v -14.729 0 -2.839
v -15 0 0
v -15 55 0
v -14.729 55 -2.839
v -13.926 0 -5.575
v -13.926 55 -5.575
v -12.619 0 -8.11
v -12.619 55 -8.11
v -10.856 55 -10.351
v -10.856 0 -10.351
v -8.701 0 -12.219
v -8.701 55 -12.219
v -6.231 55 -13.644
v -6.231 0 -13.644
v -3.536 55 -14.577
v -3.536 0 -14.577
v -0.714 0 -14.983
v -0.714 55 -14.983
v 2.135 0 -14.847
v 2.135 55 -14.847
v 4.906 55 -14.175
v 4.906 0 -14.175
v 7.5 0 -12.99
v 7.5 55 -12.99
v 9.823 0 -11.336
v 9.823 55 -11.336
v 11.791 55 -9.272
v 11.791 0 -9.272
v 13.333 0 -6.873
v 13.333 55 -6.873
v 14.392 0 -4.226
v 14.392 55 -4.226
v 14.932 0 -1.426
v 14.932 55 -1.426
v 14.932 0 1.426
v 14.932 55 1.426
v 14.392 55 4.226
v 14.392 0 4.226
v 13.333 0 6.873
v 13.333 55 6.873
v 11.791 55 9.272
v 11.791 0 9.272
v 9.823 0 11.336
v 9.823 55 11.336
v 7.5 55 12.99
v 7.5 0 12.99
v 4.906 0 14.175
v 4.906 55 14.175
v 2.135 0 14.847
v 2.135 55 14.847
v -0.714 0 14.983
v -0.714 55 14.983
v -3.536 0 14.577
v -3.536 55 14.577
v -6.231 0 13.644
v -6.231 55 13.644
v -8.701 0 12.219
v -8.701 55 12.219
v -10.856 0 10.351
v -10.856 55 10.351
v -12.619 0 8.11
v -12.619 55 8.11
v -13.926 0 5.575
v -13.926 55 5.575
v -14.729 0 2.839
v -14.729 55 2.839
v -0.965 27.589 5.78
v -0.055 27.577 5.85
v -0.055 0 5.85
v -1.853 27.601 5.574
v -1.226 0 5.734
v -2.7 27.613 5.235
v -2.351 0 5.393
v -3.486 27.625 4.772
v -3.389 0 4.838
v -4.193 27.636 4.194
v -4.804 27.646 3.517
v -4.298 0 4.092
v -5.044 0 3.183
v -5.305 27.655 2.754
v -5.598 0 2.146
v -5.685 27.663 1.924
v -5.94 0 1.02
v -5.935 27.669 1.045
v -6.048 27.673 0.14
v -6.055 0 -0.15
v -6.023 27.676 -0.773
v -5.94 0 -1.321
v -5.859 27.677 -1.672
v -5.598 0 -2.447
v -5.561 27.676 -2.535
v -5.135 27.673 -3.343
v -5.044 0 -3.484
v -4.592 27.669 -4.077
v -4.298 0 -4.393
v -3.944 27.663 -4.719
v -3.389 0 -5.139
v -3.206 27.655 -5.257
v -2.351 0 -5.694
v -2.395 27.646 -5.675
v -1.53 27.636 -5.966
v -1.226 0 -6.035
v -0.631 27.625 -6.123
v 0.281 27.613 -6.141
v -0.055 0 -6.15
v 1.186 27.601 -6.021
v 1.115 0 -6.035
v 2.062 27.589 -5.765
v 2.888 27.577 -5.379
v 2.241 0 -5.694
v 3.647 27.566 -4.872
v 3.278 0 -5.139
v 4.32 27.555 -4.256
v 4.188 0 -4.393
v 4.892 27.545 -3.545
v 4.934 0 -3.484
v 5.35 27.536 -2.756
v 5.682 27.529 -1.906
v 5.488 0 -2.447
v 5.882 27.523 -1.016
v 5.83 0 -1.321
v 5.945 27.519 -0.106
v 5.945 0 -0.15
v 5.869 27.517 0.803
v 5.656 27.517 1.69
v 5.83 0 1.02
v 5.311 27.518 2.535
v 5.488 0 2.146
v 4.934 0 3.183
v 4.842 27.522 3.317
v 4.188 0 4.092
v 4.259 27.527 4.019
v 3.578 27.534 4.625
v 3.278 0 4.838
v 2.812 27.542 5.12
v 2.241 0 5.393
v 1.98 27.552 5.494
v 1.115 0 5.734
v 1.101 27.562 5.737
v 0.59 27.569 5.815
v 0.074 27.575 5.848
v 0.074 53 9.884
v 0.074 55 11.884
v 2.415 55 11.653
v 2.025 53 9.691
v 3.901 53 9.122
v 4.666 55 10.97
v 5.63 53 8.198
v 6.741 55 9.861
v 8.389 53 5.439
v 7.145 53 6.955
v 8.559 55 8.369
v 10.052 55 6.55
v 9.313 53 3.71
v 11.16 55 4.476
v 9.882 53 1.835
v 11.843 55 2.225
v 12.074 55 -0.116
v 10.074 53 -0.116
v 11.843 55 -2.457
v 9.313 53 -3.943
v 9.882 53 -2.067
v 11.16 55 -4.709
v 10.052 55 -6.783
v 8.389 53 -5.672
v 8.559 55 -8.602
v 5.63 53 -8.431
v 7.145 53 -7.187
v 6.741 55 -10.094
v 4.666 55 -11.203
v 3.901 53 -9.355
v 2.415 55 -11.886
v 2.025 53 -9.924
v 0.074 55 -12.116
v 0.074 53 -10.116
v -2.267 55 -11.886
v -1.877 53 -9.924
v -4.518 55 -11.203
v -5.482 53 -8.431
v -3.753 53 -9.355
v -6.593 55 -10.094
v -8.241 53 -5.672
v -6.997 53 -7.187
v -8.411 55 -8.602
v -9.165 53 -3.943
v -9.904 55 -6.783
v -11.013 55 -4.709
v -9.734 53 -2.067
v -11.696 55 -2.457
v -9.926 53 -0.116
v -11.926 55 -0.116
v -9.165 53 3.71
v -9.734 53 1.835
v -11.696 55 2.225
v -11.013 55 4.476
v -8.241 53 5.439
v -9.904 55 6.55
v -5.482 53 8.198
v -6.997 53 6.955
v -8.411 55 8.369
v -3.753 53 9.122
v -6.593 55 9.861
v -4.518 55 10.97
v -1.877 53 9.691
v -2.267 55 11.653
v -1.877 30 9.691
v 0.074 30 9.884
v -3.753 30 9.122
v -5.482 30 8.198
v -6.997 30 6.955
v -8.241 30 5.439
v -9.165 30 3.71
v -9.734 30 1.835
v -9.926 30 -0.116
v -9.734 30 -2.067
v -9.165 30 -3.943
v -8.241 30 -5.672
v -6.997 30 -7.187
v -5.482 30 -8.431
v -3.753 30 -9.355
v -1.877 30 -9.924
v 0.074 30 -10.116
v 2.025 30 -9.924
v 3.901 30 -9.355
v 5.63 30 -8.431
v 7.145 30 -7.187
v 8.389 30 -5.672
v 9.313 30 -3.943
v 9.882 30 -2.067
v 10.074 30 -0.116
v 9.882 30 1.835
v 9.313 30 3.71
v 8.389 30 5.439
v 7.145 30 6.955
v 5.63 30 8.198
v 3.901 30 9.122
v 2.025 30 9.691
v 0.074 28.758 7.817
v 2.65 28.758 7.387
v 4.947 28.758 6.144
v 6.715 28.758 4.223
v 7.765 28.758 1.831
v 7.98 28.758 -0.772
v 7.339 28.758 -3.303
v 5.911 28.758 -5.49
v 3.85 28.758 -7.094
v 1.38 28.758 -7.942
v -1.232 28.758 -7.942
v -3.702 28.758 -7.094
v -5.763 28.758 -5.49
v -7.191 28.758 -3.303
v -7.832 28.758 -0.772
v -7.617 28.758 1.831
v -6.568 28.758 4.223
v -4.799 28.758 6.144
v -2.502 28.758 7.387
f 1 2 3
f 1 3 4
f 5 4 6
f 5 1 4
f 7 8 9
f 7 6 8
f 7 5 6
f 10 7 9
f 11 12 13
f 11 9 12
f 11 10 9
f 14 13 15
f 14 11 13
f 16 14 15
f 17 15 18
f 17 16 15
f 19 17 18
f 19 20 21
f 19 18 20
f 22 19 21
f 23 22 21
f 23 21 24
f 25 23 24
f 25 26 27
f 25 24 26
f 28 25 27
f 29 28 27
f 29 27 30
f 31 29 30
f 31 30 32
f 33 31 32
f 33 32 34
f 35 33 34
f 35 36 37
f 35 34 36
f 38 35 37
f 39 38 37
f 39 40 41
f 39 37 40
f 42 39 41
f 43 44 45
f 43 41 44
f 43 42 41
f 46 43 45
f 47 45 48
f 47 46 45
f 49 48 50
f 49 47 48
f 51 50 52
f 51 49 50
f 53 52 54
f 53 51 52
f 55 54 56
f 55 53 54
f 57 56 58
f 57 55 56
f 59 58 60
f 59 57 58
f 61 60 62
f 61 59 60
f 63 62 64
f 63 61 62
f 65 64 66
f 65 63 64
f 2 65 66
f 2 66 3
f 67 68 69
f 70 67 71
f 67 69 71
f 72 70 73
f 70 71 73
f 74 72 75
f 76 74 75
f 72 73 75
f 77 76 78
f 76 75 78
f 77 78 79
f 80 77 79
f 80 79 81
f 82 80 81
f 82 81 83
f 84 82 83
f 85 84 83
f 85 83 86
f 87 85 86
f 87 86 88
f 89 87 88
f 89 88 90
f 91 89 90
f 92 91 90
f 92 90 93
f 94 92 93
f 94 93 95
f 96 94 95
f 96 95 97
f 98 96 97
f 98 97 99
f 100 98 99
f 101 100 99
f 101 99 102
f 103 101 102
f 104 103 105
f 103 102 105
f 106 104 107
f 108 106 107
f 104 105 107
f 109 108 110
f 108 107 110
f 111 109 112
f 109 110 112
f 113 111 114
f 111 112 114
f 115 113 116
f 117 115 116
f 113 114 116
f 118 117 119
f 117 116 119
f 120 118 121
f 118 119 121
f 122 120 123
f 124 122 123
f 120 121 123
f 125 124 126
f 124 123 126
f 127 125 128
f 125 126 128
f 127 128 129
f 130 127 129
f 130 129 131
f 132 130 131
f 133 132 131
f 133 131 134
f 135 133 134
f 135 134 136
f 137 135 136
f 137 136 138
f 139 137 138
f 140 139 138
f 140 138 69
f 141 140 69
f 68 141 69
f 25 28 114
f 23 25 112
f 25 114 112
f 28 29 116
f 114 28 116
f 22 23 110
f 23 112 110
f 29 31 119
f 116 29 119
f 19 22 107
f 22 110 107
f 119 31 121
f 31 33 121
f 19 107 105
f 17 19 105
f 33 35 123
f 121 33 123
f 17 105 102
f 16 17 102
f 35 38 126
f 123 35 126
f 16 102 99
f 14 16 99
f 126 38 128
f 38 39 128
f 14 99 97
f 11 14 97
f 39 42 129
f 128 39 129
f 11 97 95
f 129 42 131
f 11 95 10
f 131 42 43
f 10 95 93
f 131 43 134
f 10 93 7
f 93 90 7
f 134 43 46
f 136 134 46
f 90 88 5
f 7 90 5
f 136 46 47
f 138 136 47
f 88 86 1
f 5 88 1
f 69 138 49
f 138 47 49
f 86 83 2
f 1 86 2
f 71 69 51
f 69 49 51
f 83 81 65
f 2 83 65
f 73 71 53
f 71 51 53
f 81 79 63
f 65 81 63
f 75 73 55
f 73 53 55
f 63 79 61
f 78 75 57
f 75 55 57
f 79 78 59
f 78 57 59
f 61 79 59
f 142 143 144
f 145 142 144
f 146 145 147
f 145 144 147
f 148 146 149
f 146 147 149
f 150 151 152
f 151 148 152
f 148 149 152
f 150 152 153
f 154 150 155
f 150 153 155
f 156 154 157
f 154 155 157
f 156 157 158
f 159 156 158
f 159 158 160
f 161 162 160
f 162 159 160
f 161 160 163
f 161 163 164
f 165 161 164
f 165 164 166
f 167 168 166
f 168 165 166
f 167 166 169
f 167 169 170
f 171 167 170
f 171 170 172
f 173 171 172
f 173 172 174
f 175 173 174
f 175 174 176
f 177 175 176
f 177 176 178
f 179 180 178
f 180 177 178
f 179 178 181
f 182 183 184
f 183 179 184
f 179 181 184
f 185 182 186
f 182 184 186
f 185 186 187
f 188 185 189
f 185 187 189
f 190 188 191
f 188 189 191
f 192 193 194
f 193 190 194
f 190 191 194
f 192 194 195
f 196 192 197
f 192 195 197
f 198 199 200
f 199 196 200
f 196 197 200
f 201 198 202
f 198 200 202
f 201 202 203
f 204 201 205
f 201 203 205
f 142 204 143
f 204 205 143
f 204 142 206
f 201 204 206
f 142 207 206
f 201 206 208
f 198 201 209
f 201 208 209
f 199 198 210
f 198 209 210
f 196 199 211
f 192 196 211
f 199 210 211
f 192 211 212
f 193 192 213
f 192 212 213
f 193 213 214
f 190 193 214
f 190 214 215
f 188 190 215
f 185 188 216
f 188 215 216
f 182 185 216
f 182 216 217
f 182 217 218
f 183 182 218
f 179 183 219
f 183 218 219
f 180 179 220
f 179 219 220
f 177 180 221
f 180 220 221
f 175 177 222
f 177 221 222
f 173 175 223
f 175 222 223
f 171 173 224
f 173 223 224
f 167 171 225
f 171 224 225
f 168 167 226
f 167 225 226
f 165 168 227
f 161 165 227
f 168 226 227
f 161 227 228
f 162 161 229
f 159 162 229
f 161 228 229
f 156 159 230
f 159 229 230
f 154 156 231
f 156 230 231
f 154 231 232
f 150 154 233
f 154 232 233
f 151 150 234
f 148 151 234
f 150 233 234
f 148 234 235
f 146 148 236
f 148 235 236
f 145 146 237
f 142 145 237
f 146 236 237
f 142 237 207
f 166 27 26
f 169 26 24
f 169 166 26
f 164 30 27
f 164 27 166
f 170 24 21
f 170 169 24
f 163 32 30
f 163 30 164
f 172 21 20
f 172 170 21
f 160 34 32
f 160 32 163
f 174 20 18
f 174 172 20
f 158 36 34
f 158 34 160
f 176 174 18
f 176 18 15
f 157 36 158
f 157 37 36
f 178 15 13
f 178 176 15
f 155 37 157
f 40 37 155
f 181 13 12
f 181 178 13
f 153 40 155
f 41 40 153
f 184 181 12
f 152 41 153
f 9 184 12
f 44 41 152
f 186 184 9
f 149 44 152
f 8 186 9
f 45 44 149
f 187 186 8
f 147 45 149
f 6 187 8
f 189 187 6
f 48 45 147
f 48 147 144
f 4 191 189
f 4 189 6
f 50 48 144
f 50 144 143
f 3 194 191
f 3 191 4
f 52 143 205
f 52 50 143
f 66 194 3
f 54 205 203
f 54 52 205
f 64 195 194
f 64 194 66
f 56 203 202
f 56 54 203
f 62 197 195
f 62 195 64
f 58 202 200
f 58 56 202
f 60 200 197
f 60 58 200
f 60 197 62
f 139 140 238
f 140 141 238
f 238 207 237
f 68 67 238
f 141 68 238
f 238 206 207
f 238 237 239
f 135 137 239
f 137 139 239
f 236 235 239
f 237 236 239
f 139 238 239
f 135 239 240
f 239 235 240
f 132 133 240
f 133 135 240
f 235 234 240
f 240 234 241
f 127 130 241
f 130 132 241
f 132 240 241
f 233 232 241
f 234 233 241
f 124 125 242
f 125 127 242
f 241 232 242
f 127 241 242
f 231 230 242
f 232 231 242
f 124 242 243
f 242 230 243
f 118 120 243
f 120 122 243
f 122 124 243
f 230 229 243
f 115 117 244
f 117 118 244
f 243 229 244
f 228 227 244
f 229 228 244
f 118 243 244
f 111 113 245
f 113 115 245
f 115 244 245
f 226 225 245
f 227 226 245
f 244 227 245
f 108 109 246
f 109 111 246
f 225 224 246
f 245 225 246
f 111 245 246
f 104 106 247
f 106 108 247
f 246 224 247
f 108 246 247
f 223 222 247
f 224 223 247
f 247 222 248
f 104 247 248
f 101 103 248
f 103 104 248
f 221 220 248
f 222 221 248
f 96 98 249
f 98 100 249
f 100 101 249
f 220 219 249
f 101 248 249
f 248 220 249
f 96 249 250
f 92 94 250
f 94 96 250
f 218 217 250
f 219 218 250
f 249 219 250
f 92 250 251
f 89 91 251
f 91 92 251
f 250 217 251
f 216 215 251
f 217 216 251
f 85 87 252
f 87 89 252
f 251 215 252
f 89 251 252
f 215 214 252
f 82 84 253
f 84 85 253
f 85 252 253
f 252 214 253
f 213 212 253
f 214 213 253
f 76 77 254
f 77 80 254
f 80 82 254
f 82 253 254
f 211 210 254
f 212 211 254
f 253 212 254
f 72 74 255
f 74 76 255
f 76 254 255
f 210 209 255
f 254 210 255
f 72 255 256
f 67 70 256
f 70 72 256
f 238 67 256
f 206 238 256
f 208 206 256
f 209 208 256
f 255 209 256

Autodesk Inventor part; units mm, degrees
ref_plane "YZ Plane" through (0, 0, 0) normal (1, 0, 0) x (0, 1, 0)
ref_plane "XZ Plane" through (0, 0, 0) normal (0, 1, 0) x (-1, 0, 0)
ref_plane "XY Plane" through (0, 0, 0) normal (0, 0, 1) x (1, 0, 0)
sketch "Эскиз1" plane through (0, 0, 0) normal (0, 1, 0) x (-1, 0, 0)
  circle A0 centre (0, 0) radius 15
  dimension "d0" = 30
extrude "Выдавливание1" add sketch "Эскиз1" along normal blind 55
hole "Отверстие1" at (-0.0551, 55, -0.1504) direction (0, -1, 0) diameter 12 depth 55 tip angle 118
hole "Отверстие2" at (0.0739, 55, -0.1164) direction (0, -1, 0) diameter 20 depth 25 tip angle 118
thread "Резьба1" size "M20x2.5" class "6H" standard "ANSI Metric M Profile" length 20
chamfer "Фаска1" distance 2 angle 45 1 edges at (0.0739, 55, -10.1164)
